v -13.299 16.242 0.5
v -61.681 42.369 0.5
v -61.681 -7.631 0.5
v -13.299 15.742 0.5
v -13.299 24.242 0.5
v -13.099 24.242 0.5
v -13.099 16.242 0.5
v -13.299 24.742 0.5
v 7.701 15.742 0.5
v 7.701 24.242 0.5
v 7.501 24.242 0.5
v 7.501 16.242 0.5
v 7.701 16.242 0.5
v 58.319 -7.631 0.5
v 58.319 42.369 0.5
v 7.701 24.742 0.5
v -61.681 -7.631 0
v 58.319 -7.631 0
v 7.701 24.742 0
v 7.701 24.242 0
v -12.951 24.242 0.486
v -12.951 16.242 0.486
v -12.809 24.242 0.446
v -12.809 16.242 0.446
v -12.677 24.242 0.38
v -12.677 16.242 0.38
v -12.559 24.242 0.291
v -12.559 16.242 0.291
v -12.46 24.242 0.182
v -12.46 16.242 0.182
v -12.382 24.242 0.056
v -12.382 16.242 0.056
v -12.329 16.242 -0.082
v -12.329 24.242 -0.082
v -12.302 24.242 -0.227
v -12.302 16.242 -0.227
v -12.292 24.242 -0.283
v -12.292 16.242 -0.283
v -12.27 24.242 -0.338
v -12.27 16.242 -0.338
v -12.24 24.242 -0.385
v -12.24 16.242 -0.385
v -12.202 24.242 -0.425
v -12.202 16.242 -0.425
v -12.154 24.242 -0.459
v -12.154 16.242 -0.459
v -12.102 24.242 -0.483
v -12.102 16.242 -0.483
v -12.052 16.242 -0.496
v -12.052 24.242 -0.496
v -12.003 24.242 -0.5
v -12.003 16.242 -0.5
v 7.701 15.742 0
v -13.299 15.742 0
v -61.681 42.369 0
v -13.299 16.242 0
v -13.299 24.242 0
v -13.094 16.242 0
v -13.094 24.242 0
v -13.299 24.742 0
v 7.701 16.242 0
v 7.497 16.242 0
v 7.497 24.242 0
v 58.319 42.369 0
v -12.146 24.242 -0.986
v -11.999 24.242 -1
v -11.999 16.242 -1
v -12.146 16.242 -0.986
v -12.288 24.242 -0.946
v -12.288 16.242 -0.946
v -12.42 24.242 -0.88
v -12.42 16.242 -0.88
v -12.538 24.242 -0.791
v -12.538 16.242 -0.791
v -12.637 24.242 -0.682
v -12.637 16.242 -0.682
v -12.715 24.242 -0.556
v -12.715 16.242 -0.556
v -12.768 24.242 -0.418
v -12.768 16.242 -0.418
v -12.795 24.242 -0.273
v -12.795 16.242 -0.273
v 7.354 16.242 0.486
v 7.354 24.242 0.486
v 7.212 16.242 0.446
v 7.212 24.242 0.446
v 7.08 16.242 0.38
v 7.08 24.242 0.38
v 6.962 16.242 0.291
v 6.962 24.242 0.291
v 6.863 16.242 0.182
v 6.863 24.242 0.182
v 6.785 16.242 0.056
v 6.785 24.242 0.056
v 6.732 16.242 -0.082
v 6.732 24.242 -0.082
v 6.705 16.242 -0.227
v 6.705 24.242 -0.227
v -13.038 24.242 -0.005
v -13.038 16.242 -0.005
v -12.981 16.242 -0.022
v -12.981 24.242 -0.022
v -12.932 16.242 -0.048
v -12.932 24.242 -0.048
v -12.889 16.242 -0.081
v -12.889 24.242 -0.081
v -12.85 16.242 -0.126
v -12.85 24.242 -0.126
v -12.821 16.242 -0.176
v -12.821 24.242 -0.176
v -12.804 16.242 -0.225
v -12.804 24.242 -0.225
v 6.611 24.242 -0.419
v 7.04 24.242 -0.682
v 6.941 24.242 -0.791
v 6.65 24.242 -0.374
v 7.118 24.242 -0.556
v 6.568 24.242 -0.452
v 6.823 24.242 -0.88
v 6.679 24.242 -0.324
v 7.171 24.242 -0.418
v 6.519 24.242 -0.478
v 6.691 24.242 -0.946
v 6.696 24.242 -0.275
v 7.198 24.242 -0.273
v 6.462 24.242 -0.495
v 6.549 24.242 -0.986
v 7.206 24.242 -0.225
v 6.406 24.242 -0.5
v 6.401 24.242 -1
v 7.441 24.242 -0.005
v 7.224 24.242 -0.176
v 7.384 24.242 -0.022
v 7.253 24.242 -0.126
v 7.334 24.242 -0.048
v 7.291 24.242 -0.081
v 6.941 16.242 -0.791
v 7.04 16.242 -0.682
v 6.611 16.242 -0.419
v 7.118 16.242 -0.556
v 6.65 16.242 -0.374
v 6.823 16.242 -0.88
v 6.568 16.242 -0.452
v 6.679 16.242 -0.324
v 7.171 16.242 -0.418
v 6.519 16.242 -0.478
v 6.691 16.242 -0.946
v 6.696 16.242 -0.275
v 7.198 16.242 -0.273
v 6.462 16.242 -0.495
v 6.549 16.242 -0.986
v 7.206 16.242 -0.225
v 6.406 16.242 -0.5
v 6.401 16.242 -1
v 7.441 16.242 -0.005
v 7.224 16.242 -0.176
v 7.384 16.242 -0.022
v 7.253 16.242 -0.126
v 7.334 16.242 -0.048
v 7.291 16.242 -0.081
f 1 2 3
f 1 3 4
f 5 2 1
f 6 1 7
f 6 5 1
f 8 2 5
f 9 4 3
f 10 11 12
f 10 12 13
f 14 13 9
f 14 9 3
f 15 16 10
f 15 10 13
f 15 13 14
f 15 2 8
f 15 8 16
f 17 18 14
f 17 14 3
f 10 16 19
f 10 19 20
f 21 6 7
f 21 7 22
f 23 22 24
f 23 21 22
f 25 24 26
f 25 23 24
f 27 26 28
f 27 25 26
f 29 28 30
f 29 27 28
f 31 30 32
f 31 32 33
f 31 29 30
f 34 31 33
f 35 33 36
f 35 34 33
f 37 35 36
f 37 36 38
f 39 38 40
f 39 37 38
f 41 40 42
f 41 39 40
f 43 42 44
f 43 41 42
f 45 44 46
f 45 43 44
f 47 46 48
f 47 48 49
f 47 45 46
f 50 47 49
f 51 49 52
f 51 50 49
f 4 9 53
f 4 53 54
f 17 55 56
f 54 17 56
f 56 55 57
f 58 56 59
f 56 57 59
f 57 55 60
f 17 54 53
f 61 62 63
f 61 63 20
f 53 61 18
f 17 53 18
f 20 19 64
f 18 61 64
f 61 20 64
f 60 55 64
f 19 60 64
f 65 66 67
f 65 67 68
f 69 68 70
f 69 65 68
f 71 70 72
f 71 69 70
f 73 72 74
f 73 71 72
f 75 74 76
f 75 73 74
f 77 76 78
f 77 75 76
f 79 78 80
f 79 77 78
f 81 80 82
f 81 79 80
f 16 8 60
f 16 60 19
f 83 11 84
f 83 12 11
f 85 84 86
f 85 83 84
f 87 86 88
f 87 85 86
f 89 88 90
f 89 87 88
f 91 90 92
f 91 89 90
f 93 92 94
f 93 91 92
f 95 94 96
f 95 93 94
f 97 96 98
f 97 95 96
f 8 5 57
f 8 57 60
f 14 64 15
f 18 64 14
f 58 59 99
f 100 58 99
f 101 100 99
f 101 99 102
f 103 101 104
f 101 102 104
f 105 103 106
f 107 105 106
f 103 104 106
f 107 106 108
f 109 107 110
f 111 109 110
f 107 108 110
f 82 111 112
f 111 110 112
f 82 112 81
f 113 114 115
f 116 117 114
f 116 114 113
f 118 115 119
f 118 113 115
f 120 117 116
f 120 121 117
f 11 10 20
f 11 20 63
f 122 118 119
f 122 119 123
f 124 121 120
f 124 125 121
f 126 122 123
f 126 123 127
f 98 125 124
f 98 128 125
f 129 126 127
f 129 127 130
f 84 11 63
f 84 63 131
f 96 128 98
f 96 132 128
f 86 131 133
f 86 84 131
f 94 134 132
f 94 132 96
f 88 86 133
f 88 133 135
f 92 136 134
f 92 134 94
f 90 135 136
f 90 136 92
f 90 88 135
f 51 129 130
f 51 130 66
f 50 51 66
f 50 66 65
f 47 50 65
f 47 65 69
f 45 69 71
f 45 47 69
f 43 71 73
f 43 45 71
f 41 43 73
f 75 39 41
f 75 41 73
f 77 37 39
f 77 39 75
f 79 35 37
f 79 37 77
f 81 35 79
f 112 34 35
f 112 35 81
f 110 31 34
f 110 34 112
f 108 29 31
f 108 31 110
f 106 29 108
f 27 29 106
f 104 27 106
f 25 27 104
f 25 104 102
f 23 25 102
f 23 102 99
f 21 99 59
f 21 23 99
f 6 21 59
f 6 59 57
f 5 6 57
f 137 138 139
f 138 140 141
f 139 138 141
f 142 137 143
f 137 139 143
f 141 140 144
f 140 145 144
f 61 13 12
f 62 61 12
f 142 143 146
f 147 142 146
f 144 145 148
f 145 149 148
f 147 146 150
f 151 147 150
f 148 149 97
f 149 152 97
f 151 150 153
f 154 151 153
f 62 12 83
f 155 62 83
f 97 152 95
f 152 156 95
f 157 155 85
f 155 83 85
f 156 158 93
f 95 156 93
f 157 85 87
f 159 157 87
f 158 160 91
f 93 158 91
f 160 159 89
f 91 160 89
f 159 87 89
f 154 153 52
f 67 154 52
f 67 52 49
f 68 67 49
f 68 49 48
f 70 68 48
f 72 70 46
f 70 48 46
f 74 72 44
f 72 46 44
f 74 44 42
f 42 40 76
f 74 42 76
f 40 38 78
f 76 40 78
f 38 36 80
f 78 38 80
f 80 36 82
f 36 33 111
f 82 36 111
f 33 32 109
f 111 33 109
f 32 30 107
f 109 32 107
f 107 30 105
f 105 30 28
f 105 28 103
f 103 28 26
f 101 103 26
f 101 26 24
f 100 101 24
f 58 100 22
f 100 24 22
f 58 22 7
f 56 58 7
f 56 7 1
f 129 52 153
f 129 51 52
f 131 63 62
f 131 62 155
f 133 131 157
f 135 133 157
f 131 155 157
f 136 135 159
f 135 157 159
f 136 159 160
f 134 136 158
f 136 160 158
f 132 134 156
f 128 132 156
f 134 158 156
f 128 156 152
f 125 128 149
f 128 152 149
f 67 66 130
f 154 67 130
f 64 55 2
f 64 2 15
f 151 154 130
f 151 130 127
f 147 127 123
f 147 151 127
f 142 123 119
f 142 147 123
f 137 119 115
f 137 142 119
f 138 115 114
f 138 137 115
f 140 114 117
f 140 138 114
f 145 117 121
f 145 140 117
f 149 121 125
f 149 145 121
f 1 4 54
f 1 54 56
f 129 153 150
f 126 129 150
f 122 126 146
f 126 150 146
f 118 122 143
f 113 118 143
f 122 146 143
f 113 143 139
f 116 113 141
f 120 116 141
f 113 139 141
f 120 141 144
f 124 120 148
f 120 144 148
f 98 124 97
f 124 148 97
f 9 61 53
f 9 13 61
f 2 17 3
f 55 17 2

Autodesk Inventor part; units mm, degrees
ref_plane "YZ Plane" through (0, 0, 0) normal (1, 0, 0) x (0, 1, 0)
ref_plane "XZ Plane" through (0, 0, 0) normal (0, 1, 0) x (-1, 0, 0)
ref_plane "XY Plane" through (0, 0, 0) normal (0, 0, 1) x (1, 0, 0)
sketch "Sketch1" plane through (0, 0, 0) normal (0, 0, 1) x (1, 0, 0)
  line L0 (-61.6808, 42.3688) -> (58.3192, 42.3688)
  line L1 (58.3192, 42.3688) -> (58.3192, -7.6312)
  line L2 (58.3192, -7.6312) -> (-61.6808, -7.6312)
  line L3 (-61.6808, -7.6312) -> (-61.6808, 42.3688)
  dimension "d0" = 50
  dimension "d1" = 120
extrude "Plate1" add sketch "Sketch1" along normal blind 0.5
sketch "Sketch2" plane through (0, 0, 0.5) normal (0, 0, 1) x (1, 0, 0)
  line L0 (-12.7986, 24.2423) -> (7.2014, 24.2423)
  line L1 (7.2014, 24.2423) -> (7.2014, 16.2423)
  line L2 (7.2014, 16.2423) -> (-12.7986, 16.2423)
  line L3 (-12.7986, 16.2423) -> (-12.7986, 24.2423)
  point P0 (-2.7986, 20.2423)
  dimension "LG_G" = 20
  dimension "LT_G" = 8
  dimension "d21" = 4
  dimension "d22" = 10
extrude "Extrusion1" add sketch "Sketch2" against normal blind 1.5
sketch "Sketch3" plane through (0, 0, 0.5) normal (0, 0, 1) x (1, 0, 0)
  line L0 (-12.7986, 24.2423) -> (7.2014, 24.2423) projected
  line L1 (-12.7986, 16.2423) -> (-12.7986, 24.2423) projected
  line L2 (7.2014, 16.2423) -> (-12.7986, 16.2423) projected
  line L3 (7.2014, 24.2423) -> (7.2014, 16.2423) projected
  line L4 (-12.2986, 24.2423) -> (6.7014, 24.2423)
  line L5 (6.7014, 24.2423) -> (6.7014, 16.2423)
  line L6 (6.7014, 16.2423) -> (-12.2986, 16.2423)
  line L7 (-12.2986, 16.2423) -> (-12.2986, 24.2423)
  dimension "d9" = 0.5
  dimension "d10" = 0.5
extrude "Extrusion2" cut sketch "Sketch3" against normal blind 1 contours L0 L5 L2 L7
sketch "Sketch4" plane through (0, 0, 0.5) normal (0, 0, 1) x (1, 0, 0)
  line L0 (-12.7986, 24.2423) -> (7.2014, 24.2423) projected
  line L1 (-12.7986, 16.2423) -> (-12.7986, 24.2423) projected
  line L2 (7.2014, 24.2423) -> (7.2014, 16.2423) projected
  line L3 (7.2014, 16.2423) -> (-12.7986, 16.2423) projected
  line L4 (-13.2986, 24.7423) -> (7.7014, 24.7423)
  line L5 (7.7014, 24.7423) -> (7.7014, 24.2423)
  line L6 (7.7014, 24.2423) -> (-13.2986, 24.2423)
  line L7 (-13.2986, 24.2423) -> (-13.2986, 24.7423)
  line L8 (-13.2986, 16.2423) -> (7.7014, 16.2423)
  line L9 (7.7014, 16.2423) -> (7.7014, 15.7423)
  line L10 (7.7014, 15.7423) -> (-13.2986, 15.7423)
  line L11 (-13.2986, 15.7423) -> (-13.2986, 16.2423)
  line L12 (6.7014, 16.2423) -> (-12.2986, 16.2423) projected
  dimension "d13" = 0.5
  dimension "d14" = 0.5
  dimension "d15" = 0.5
  dimension "d16" = 0.5
extrude "Cut1" cut sketch "Sketch4" against normal blind 0.5 contours L6 L7 L4 L5 L0 | L3 L8 L9 L10 L11
fillet "Fillet1" radius 0.8 4 edges at (-12.2986, 20.2423, 0.5) (6.7014, 20.2423, 0.5) (-12.7986, 20.2423, -1) (7.2014, 20.2423, -1)
fillet "Fillet2" radius 0.3 4 edges at (7.2014, 20.2423, 0) (-12.7986, 20.2423, 0) (-12.2986, 20.2423, -0.5) (6.7014, 20.2423, -0.5)
equation "\"d21\" = 0.5 * LT_G"
equation "\"d22\" = 0.5 * LG_G"
equation "\"d7\" = 3 * Thickness"
equation "\"d9\" = Thickness"
equation "\"d10\" = Thickness"
equation "\"d11\" = 2 * Thickness"
equation "\"d13\" = Thickness"
equation "\"d14\" = Thickness"
equation "\"d15\" = Thickness"
equation "\"d16\" = Thickness"
equation "\"d17\" = Thickness"
equation "\"d2\" = Thickness"
equation "\"BendRadius\" = Thickness"
equation "\"BendReliefWidth\" = Thickness"
equation "\"BendReliefDepth\" = 0.5 * Thickness"
equation "\"CornerReliefSize\" = 4 * Thickness"
equation "\"MinimumRemnant\" = 2 * Thickness"
equation "\"TransitionRadius\" = BendRadius"
equation "\"JacobiRadiusSize\" = BendRadius"
equation "\"GapSize\" = Thickness"
equation "\"Thickness\" = 0.5"
properties part number "DecupajAgatare1"
